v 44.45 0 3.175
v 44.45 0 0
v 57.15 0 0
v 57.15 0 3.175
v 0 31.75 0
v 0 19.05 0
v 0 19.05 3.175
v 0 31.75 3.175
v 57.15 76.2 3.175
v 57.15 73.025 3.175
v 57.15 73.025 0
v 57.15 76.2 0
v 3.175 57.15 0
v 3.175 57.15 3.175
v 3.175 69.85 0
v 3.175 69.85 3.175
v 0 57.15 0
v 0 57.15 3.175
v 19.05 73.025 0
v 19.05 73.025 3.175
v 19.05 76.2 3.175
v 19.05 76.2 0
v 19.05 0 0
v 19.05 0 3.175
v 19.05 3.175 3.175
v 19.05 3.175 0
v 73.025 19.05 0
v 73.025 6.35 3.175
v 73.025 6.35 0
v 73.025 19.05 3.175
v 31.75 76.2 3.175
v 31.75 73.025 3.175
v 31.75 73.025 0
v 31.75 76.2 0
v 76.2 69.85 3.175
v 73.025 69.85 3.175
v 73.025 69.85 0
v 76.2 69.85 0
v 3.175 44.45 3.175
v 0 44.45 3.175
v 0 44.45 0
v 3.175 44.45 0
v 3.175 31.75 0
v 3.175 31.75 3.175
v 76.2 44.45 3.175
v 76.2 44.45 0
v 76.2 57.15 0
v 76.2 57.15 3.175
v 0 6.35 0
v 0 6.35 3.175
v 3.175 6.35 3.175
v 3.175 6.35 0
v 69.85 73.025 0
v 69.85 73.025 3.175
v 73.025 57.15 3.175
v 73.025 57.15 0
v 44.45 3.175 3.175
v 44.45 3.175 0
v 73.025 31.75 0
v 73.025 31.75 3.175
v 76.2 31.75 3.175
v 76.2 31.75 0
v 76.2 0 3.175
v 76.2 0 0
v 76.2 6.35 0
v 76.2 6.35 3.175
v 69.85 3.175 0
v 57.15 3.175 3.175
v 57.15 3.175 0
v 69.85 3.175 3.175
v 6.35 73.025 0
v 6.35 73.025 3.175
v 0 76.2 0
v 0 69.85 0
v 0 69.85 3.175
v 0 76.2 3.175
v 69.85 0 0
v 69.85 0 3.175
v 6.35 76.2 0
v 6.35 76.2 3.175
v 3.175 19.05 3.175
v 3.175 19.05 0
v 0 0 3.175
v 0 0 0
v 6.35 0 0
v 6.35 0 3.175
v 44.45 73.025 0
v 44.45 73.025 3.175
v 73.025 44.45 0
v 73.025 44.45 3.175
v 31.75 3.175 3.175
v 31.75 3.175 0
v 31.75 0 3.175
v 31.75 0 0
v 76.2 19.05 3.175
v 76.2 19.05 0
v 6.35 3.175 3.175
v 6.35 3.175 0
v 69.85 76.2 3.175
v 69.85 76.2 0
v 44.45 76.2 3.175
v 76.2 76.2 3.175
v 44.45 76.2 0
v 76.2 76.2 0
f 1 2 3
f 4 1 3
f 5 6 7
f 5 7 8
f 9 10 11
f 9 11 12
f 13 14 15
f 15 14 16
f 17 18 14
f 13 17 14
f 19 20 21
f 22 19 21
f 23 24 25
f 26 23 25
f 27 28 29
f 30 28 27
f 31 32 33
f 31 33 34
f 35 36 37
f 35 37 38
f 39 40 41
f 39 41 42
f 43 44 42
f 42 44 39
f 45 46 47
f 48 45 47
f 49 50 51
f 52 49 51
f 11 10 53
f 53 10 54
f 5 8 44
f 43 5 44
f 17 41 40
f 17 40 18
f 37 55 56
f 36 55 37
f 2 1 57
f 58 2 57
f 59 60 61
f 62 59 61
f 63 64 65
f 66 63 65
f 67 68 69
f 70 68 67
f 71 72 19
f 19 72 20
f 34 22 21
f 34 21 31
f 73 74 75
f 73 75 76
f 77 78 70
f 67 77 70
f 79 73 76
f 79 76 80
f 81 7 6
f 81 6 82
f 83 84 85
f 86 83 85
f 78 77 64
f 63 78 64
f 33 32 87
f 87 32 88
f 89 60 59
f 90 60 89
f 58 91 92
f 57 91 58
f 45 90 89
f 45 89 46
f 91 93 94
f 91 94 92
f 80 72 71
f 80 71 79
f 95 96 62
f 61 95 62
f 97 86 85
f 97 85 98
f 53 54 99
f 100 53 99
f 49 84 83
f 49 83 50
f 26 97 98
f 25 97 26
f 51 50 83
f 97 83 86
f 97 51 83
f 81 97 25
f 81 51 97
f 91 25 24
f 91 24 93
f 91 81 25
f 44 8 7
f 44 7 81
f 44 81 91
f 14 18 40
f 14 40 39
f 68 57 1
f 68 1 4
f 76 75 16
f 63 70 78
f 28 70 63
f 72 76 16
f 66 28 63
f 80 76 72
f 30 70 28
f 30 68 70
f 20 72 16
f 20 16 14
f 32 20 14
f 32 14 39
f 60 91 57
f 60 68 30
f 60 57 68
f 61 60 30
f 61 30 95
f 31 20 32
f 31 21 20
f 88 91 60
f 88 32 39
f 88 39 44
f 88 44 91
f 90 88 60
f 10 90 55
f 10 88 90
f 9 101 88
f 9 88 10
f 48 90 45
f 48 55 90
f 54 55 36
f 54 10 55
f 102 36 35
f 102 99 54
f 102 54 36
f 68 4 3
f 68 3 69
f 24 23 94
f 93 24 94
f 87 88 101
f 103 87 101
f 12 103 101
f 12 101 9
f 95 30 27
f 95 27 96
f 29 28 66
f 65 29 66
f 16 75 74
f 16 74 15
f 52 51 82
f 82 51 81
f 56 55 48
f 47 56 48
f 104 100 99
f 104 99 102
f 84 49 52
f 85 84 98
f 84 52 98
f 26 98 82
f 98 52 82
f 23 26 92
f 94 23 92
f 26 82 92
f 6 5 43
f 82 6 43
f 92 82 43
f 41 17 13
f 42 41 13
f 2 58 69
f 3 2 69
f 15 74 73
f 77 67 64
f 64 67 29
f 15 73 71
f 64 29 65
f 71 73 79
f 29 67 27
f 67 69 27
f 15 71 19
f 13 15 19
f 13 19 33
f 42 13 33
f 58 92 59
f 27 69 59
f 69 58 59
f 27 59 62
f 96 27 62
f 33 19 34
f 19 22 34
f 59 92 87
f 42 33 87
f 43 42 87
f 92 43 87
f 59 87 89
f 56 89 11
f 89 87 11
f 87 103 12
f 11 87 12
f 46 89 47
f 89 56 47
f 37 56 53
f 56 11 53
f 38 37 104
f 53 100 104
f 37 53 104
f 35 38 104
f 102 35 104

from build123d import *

# Parameters (mm, degrees)
SKETCH1_W            = 76.2
SKETCH1_H            = 76.2
EXTRUDE1_DEPTH       = 3.175
SKETCH3_W            = 3.175
SKETCH3_H            = 12.7
CUT_EXTRUDE1_DEPTH   = 3.175
LPATTERN1_COUNT      = 3
LPATTERN1_PITCH      = 25.4
LPATTERN1_COUNT_DIR2 = 2
LPATTERN1_PITCH_DIR2 = 73.025
SKETCH4_W            = 12.7
SKETCH4_H            = 3.175
CUT_EXTRUDE2_DEPTH   = 3.175
LPATTERN2_COUNT      = 3
LPATTERN2_PITCH      = 25.4
LPATTERN2_COUNT_DIR2 = 2
LPATTERN2_PITCH_DIR2 = 73.025


with BuildPart() as part:
    # Sketch1 → Extrude1 (new body)
    with BuildSketch(Plane.XY):
        with Locations((38.1, 38.1)):
            Rectangle(SKETCH1_W, SKETCH1_H)
    extrude(amount=EXTRUDE1_DEPTH)

    # Sketch3 → Cut-Extrude1 (cut)
    with BuildSketch(Plane.XY.offset(3.175)):
        with Locations((74.6125, 63.5)):
            Rectangle(SKETCH3_W, SKETCH3_H)
    cut_extrude1 = extrude(amount=-CUT_EXTRUDE1_DEPTH, mode=Mode.SUBTRACT)

    # LPattern1: Cut-Extrude1 3 × 2
    with Locations(*[(-j * LPATTERN1_PITCH_DIR2, -i * LPATTERN1_PITCH, 0) for i in range(LPATTERN1_COUNT) for j in range(LPATTERN1_COUNT_DIR2) if (i, j) != (0, 0)]):
        add(cut_extrude1, mode=Mode.SUBTRACT)

    # Sketch4 → Cut-Extrude2 (cut)
    with BuildSketch(Plane.XY.offset(3.175)):
        with Locations((63.5, 74.6125)):
            Rectangle(SKETCH4_W, SKETCH4_H)
    cut_extrude2 = extrude(amount=-CUT_EXTRUDE2_DEPTH, mode=Mode.SUBTRACT)

    # LPattern2: Cut-Extrude2 3 × 2
    with Locations(*[(-i * LPATTERN2_PITCH, -j * LPATTERN2_PITCH_DIR2, 0) for i in range(LPATTERN2_COUNT) for j in range(LPATTERN2_COUNT_DIR2) if (i, j) != (0, 0)]):
        add(cut_extrude2, mode=Mode.SUBTRACT)


solid = part.part
